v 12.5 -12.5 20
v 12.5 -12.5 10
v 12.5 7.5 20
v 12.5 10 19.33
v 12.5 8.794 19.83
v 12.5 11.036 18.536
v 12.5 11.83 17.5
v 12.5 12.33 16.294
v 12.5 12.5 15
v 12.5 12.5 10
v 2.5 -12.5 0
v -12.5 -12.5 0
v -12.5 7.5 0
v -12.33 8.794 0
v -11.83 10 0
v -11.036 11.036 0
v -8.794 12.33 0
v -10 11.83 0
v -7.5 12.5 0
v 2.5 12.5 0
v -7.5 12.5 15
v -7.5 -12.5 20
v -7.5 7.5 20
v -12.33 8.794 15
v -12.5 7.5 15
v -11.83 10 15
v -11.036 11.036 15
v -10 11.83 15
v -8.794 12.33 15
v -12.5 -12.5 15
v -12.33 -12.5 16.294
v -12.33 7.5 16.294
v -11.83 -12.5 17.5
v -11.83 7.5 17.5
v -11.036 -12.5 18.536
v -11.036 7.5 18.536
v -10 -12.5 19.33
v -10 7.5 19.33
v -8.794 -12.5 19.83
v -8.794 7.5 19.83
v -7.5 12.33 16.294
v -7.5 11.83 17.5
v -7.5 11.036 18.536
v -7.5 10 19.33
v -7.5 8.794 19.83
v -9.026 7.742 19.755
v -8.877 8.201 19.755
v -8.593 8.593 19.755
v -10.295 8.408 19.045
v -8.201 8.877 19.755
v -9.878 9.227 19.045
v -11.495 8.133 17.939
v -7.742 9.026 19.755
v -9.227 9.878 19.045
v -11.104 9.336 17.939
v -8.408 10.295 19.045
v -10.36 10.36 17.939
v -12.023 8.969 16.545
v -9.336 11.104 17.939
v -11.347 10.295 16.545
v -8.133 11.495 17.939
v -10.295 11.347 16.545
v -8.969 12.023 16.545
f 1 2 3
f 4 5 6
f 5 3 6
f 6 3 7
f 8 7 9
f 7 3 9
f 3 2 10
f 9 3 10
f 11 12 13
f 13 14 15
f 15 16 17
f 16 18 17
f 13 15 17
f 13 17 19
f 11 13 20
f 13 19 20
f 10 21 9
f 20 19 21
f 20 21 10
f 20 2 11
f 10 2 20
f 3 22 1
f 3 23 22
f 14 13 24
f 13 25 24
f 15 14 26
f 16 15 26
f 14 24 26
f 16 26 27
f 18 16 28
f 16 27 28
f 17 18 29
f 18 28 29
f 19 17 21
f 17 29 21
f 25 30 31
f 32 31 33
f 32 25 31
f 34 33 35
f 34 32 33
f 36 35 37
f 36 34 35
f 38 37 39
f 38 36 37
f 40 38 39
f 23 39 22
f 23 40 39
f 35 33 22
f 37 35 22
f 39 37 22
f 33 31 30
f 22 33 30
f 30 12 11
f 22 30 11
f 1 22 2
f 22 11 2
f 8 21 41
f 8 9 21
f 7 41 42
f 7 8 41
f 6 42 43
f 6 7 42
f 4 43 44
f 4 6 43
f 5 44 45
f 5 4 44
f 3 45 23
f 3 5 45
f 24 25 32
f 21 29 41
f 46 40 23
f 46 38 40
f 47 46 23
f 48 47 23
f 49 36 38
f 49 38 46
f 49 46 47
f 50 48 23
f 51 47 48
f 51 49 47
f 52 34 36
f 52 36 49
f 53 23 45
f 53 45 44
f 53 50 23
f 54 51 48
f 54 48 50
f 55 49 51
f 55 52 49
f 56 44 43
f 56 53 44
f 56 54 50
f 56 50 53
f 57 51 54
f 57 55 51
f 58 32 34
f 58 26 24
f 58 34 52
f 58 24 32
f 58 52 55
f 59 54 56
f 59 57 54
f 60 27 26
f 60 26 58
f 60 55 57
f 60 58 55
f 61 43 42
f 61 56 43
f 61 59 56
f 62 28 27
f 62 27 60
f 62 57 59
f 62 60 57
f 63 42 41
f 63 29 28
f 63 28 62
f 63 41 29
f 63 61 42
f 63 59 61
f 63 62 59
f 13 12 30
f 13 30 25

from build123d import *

# Parameters (mm, degrees)
F0_W     = 25
F0_H     = 25
F1_DEPTH = 20
F2_R     = 5
F3_SIZE  = 10


with BuildPart() as f1:
    # F0 (on Top) → F1 (new body)
    with BuildSketch(Plane.XY):
        Rectangle(F0_W, F0_H)
    extrude(amount=F1_DEPTH)

    # F2
    f2_edges = [f1.edges().sort_by_distance(p)[0] for p in [
        (-12.5, 12.5, 10),
        (-12.5, 0, 20),
        (0, 12.5, 20),
    ]]
    fillet(f2_edges, radius=F2_R)

    # F3
    f3_edges = [f1.edges().sort_by_distance(p)[0] for p in [
        (12.5, 0, 0),
    ]]
    chamfer(f3_edges, length=F3_SIZE)


solid = f1.part
